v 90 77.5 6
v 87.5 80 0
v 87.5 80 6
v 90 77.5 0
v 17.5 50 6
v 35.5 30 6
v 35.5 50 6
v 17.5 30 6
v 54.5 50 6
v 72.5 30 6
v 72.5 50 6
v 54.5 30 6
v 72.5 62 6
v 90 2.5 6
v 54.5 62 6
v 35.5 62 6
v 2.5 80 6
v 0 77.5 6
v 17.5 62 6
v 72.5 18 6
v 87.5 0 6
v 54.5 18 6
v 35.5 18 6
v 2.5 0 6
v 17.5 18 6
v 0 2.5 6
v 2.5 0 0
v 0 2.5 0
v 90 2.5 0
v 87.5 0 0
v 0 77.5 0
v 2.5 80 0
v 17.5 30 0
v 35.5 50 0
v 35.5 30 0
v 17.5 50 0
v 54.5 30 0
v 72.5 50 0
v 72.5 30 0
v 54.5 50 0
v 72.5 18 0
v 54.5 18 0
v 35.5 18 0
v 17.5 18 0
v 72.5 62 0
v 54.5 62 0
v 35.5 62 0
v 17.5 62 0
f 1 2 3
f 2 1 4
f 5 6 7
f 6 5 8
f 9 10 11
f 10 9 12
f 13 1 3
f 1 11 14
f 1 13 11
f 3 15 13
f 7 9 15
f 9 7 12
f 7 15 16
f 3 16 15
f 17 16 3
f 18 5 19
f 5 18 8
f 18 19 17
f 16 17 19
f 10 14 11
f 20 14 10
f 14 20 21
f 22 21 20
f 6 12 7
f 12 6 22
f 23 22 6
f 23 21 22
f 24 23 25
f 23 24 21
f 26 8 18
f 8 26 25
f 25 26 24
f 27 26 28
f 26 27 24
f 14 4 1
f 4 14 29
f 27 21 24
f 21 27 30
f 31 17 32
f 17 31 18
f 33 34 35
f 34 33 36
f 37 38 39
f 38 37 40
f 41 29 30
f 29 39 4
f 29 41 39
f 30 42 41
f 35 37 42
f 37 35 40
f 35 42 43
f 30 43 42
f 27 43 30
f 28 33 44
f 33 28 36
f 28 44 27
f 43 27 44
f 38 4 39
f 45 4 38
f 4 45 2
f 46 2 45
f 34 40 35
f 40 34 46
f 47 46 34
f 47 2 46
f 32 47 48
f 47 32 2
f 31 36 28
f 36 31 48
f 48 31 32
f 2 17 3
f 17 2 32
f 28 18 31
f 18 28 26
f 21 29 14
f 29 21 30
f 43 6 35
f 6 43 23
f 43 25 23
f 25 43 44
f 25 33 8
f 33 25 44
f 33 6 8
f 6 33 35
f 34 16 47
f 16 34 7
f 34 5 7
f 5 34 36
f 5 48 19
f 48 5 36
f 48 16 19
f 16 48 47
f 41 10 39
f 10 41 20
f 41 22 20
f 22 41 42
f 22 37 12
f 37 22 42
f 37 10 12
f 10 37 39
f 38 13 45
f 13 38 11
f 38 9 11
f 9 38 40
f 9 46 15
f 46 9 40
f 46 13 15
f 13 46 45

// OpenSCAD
$fn = 32;

// ----------------------------------------------------------------------
// Windowed plate: 4 voids, 90 x 80 x 6 mm
// ----------------------------------------------------------------------

// --- parameters (mm) ---
plate_l = 90;             // plate length, X
plate_w = 80;             // plate width, Y
plate_t = 6;              // plate thickness, Z
edge_margin = 8;          // wall from the plate edge to any window
win_l = 18;               // pocket length
win_w = 12;               // pocket width
pitch_x = 37;             // grid pitch along X
pitch_y = 32;             // grid pitch along Y
depth_1 = 6;              // depth of void 1 (full thickness = through)
depth_2 = 6;              // depth of void 2 (full thickness = through)
depth_3 = 6;              // depth of void 3 (full thickness = through)
depth_4 = 6;              // depth of void 4 (full thickness = through)
corner_c = 2.5;           // corner chamfer of the plate
fit_tol = 0.02;           // declared fit tolerance (prompt contract)
free_tol = 0.2;           // declared free tolerance (prompt contract)

profile = [[2.5, 0], [87.5, 0], [90, 2.5], [90, 77.5], [87.5, 80], [2.5, 80], [0, 77.5], [0, 2.5]];  // primary outline, 8 points, counter clockwise
void_1 = [[17.5, 18], [35.5, 18], [35.5, 30], [17.5, 30]];  // pocket at grid node 0,0, 4 points
void_2 = [[17.5, 50], [35.5, 50], [35.5, 62], [17.5, 62]];  // pocket at grid node 0,1, 4 points
void_3 = [[54.5, 18], [72.5, 18], [72.5, 30], [54.5, 30]];  // pocket at grid node 1,0, 4 points
void_4 = [[54.5, 50], [72.5, 50], [72.5, 62], [54.5, 62]];  // pocket at grid node 1,1, 4 points

// --- the one profile operation ---
difference() {
  linear_extrude(height = plate_t) polygon(points = profile);
  translate([0, 0, -1])
    linear_extrude(height = plate_t + 2) polygon(points = void_1);
  translate([0, 0, -1])
    linear_extrude(height = plate_t + 2) polygon(points = void_2);
  translate([0, 0, -1])
    linear_extrude(height = plate_t + 2) polygon(points = void_3);
  translate([0, 0, -1])
    linear_extrude(height = plate_t + 2) polygon(points = void_4);
}
